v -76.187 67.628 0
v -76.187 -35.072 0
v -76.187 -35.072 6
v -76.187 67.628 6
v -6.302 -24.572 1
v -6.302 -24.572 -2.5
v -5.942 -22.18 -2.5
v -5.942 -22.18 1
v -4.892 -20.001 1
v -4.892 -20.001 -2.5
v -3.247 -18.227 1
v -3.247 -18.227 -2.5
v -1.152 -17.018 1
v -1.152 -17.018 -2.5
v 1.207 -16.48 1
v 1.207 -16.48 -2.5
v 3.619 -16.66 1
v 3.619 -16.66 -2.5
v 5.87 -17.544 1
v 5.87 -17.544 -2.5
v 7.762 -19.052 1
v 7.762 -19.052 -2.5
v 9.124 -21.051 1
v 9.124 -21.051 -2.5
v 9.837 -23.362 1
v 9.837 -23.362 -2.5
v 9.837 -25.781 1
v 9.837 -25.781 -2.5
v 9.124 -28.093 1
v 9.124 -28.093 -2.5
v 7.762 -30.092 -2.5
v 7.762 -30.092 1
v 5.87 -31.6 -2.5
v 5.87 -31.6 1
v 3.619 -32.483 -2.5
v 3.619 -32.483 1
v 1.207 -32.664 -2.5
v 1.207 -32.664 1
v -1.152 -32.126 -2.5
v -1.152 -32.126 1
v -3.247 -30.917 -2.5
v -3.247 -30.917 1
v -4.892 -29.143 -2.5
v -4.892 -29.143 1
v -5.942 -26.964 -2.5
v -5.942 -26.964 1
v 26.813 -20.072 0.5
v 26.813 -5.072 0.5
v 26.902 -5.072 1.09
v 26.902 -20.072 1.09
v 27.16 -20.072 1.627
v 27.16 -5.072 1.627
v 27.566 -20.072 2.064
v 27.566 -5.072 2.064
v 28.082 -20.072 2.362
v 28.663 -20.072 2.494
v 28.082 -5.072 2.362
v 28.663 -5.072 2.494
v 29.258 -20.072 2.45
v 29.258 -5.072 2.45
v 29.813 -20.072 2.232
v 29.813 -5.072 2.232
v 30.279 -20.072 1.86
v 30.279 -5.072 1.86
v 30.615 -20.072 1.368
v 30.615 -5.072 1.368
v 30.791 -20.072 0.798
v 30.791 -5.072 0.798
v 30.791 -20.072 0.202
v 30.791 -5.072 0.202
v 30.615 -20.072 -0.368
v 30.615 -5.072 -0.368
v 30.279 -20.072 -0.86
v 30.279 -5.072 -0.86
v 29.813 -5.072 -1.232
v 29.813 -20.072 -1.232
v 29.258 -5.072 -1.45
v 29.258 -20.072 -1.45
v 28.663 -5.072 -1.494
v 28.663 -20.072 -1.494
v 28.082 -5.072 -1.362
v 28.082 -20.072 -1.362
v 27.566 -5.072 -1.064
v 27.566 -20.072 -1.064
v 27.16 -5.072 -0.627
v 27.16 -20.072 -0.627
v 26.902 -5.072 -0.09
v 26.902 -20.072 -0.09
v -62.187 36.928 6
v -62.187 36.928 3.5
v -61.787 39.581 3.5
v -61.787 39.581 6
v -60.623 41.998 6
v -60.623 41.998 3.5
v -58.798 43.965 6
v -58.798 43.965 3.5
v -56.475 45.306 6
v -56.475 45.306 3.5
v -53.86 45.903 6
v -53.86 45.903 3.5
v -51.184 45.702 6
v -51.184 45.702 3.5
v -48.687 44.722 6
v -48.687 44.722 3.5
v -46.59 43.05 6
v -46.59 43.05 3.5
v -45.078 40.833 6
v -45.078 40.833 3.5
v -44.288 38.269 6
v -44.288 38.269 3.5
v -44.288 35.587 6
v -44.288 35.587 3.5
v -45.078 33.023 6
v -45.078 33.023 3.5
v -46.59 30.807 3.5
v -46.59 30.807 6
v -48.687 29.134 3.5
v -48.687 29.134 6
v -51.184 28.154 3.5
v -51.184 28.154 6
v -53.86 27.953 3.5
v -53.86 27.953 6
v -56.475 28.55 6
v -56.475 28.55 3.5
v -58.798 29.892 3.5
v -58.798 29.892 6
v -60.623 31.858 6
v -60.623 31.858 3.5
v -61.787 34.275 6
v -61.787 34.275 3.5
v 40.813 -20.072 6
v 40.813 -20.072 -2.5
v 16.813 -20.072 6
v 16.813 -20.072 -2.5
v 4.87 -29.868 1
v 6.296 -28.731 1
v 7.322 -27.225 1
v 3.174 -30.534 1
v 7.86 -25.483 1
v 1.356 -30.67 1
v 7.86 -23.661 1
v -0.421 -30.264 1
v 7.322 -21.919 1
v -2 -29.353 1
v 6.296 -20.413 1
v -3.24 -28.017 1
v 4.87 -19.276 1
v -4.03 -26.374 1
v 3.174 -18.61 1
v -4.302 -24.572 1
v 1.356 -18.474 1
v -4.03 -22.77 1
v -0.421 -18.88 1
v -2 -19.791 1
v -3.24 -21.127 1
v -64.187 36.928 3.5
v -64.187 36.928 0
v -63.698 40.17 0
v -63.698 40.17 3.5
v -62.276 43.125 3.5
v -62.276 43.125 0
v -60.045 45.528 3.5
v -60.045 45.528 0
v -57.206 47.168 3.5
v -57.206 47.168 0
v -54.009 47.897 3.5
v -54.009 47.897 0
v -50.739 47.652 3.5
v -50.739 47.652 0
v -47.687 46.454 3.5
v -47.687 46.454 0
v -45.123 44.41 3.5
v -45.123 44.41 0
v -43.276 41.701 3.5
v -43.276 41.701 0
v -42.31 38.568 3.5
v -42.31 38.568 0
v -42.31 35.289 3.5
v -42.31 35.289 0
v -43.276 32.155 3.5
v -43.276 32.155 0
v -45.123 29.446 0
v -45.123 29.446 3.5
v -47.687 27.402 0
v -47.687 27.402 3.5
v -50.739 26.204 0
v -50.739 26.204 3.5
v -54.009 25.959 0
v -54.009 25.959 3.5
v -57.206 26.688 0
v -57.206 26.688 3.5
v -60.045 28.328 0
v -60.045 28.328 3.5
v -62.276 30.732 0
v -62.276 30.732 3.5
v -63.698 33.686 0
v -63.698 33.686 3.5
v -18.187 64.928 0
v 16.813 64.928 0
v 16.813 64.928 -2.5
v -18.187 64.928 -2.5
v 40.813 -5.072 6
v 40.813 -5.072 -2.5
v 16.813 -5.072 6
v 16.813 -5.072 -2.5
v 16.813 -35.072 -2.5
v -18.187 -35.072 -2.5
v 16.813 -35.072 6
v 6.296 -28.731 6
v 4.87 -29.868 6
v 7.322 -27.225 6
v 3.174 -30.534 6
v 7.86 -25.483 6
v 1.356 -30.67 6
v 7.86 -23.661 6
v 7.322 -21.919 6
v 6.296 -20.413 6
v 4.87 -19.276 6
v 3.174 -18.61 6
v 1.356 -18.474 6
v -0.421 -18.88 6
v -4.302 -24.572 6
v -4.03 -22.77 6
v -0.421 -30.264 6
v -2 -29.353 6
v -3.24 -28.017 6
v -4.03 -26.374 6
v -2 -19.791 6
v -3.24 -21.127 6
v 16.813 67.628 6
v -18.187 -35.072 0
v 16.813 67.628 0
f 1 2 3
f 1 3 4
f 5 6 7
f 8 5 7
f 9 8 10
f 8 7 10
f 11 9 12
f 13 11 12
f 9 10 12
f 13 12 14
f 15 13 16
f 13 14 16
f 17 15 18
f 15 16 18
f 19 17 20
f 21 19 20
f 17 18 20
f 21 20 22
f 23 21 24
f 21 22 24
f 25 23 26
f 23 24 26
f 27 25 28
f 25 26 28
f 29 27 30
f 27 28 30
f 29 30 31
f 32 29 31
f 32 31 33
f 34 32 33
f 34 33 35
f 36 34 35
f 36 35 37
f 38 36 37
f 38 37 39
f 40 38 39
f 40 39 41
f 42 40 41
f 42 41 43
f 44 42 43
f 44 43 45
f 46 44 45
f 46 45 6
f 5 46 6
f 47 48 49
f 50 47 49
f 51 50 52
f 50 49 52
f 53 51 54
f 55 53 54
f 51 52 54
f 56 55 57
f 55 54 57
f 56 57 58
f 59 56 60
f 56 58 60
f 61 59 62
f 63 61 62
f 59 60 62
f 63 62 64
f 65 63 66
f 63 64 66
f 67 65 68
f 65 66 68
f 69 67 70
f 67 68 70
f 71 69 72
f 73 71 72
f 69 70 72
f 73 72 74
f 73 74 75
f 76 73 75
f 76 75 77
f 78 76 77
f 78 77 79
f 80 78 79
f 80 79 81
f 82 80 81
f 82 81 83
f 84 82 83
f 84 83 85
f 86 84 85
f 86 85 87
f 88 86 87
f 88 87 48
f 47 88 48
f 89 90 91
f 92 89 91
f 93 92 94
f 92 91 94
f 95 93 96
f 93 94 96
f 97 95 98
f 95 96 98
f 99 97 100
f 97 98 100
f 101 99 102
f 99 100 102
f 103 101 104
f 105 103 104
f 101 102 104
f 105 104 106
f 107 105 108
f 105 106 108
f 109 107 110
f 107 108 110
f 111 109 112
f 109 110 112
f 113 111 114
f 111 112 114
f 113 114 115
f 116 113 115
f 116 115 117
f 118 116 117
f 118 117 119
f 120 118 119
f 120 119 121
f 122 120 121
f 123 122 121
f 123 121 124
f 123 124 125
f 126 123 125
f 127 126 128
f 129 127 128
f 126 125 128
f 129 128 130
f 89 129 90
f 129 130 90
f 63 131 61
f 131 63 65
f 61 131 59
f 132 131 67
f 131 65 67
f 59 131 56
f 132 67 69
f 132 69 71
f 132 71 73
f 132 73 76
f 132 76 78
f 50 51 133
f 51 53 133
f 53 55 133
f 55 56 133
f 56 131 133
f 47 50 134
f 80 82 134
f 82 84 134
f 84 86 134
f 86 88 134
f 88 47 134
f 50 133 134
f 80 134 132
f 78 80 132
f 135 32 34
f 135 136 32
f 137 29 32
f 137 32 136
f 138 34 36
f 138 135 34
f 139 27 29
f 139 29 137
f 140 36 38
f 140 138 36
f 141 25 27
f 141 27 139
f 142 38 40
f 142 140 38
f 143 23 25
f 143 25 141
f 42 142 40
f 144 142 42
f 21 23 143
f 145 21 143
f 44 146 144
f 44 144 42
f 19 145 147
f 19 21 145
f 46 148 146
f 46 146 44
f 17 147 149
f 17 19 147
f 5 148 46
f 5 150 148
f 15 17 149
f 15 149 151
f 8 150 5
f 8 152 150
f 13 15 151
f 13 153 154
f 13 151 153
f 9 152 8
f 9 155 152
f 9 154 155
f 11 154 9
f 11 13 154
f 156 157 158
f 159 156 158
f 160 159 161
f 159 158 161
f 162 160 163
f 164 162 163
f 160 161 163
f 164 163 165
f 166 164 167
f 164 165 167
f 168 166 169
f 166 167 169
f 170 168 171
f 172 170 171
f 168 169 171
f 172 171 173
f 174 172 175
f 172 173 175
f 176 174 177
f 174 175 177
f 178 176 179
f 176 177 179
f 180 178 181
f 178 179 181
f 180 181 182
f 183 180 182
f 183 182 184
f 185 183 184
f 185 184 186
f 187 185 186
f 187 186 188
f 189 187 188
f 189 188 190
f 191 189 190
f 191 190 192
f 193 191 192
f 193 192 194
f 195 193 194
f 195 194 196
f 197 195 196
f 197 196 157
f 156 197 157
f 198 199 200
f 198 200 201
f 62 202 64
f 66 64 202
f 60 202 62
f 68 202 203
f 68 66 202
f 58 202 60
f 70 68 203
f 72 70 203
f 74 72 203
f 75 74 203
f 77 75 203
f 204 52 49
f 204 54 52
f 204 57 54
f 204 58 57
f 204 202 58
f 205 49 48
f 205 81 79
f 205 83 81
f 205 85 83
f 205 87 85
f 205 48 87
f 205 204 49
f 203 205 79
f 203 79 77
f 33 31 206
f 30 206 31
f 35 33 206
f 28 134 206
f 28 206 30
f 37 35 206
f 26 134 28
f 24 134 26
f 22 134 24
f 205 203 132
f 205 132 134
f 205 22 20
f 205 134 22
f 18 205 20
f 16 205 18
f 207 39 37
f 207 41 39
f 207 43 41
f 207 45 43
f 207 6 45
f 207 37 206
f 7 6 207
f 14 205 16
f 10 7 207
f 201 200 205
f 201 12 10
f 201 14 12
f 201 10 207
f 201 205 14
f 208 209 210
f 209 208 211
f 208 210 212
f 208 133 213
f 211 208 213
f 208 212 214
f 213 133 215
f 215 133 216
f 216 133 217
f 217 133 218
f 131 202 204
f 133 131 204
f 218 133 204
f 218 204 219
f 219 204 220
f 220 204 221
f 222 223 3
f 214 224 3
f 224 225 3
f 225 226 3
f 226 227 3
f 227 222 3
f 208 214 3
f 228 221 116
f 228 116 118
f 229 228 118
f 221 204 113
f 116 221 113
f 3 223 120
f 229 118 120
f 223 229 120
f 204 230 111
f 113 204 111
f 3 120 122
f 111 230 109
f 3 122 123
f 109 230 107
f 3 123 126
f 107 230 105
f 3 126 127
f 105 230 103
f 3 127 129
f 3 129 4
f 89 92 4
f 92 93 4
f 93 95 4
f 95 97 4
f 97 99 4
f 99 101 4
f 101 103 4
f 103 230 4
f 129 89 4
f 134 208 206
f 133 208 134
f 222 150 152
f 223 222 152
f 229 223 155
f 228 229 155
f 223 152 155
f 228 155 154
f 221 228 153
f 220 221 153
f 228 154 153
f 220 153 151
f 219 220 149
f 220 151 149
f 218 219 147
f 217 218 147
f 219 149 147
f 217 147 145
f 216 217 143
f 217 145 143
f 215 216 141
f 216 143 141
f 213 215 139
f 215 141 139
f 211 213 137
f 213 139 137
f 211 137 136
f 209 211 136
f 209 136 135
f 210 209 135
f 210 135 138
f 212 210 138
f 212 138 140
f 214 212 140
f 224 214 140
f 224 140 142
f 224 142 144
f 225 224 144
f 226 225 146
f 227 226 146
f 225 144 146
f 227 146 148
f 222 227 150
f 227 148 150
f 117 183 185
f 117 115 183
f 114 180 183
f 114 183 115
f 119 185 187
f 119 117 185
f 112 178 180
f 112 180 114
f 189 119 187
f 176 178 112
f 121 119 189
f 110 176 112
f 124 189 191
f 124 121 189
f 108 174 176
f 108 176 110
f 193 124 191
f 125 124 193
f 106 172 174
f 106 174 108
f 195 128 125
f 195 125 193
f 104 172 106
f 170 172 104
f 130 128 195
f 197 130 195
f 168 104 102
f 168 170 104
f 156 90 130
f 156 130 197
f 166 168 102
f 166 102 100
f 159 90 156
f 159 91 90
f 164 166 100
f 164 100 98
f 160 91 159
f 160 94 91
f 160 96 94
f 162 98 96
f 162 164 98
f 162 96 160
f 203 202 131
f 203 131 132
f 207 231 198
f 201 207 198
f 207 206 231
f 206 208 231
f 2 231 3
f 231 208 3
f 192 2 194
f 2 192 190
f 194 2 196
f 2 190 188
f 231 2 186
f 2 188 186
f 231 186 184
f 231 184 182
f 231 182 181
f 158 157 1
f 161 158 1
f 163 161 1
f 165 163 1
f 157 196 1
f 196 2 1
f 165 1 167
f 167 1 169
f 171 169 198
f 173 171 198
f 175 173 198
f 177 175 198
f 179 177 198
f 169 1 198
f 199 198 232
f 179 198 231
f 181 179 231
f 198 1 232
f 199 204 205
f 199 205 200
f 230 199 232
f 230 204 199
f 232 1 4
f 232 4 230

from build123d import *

# Parameters (mm, degrees)
SKETCH1_W           = 93
SKETCH1_H           = 102.7
BOSS_EXTRUDE2_DEPTH = 6
SKETCH3_W           = 35
SKETCH3_H           = 100
BOSS_EXTRUDE3_DEPTH = 2.5
SKETCH4_W           = 8.5
SKETCH4_H           = 15
BOSS_EXTRUDE4_DEPTH = 24
SKETCH5_R           = 2
CUT_EXTRUDE1_DEPTH  = 50
SKETCH6_R           = 8.115
CUT_EXTRUDE2_DEPTH  = 50
SKETCH7_R           = 11
CUT_EXTRUDE3_DEPTH  = 50
EXTRUDE_THIN1_START = -3.5
SKETCH7_AGAIN_R     = 11
SKETCH7_AGAIN_R_2   = 9
EXTRUDE_THIN1_DEPTH = 2.5
EXTRUDE_THIN2_START = -3.5
SKETCH6_2_R         = 8.115
SKETCH6_2_R_2       = 6.115
EXTRUDE_THIN2_DEPTH = 5


with BuildPart() as part:
    # Sketch1 → Boss-Extrude2 (new body)
    with BuildSketch(Plane.XY):
        with Locations((-29.68705036, 16.278057554)):
            Rectangle(SKETCH1_W, SKETCH1_H)
    extrude(amount=BOSS_EXTRUDE2_DEPTH)

    # Sketch3 → Boss-Extrude3 (add)
    with BuildSketch(Plane(origin=(0, 0, 0), x_dir=(-1, 0, 0), z_dir=(0, 0, -1))):
        with Locations((0.68705036, 14.928057554)):
            Rectangle(SKETCH3_W, SKETCH3_H)
    extrude(amount=BOSS_EXTRUDE3_DEPTH)

    # Sketch4 → Boss-Extrude4 (add)
    with BuildSketch(Plane(origin=(16.81294964, 0, 0), x_dir=(0, 0, -1), z_dir=(1, 0, 0))):
        with Locations((-1.75, -12.571942446)):
            Rectangle(SKETCH4_W, SKETCH4_H)
    extrude(amount=BOSS_EXTRUDE4_DEPTH)

    # Sketch5 → Cut-Extrude1 (cut)
    with BuildSketch(Plane(origin=(0, -5.071942446, 0), x_dir=(1, 0, 0), z_dir=(0, 1, 0))):
        with Locations(Location((28.81294964, -0.5, 0), (0, 0, 180))):
            Circle(SKETCH5_R)
    extrude(amount=-CUT_EXTRUDE1_DEPTH, mode=Mode.SUBTRACT)

    # Sketch6 → Cut-Extrude2 (cut)
    with BuildSketch(Plane(origin=(0, 0, -2.5), x_dir=(-1, 0, 0), z_dir=(0, 0, -1))):
        with Locations((-1.81294964, -24.571942446)):
            Circle(SKETCH6_R)
    extrude(amount=-CUT_EXTRUDE2_DEPTH, mode=Mode.SUBTRACT)

    # Sketch7 → Cut-Extrude3 (cut)
    with BuildSketch(Plane(origin=(0, 0, 0), x_dir=(-1, 0, 0), z_dir=(0, 0, -1))):
        with Locations((53.18705036, 36.928057554)):
            Circle(SKETCH7_R)
    extrude(amount=-CUT_EXTRUDE3_DEPTH, mode=Mode.SUBTRACT)

    # Sketch7 again → Extrude-Thin1 (add)
    with BuildSketch(Plane(origin=(0, 0, 0), x_dir=(-1, 0, 0), z_dir=(0, 0, -1)).offset(EXTRUDE_THIN1_START)):
        with Locations((53.18705036, 36.928057554)):
            Circle(SKETCH7_AGAIN_R)
        with Locations((53.18705036, 36.928057554)):
            Circle(SKETCH7_AGAIN_R_2, mode=Mode.SUBTRACT)
    extrude(amount=-EXTRUDE_THIN1_DEPTH)

    # Sketch6<2> → Extrude-Thin2 (add)
    with BuildSketch(Plane(origin=(0, 0, -2.5), x_dir=(-1, 0, 0), z_dir=(0, 0, -1)).offset(EXTRUDE_THIN2_START)):
        with Locations((-1.81294964, -24.571942446)):
            Circle(SKETCH6_2_R)
        with Locations((-1.81294964, -24.571942446)):
            Circle(SKETCH6_2_R_2, mode=Mode.SUBTRACT)
    extrude(amount=-EXTRUDE_THIN2_DEPTH)


solid = part.part
